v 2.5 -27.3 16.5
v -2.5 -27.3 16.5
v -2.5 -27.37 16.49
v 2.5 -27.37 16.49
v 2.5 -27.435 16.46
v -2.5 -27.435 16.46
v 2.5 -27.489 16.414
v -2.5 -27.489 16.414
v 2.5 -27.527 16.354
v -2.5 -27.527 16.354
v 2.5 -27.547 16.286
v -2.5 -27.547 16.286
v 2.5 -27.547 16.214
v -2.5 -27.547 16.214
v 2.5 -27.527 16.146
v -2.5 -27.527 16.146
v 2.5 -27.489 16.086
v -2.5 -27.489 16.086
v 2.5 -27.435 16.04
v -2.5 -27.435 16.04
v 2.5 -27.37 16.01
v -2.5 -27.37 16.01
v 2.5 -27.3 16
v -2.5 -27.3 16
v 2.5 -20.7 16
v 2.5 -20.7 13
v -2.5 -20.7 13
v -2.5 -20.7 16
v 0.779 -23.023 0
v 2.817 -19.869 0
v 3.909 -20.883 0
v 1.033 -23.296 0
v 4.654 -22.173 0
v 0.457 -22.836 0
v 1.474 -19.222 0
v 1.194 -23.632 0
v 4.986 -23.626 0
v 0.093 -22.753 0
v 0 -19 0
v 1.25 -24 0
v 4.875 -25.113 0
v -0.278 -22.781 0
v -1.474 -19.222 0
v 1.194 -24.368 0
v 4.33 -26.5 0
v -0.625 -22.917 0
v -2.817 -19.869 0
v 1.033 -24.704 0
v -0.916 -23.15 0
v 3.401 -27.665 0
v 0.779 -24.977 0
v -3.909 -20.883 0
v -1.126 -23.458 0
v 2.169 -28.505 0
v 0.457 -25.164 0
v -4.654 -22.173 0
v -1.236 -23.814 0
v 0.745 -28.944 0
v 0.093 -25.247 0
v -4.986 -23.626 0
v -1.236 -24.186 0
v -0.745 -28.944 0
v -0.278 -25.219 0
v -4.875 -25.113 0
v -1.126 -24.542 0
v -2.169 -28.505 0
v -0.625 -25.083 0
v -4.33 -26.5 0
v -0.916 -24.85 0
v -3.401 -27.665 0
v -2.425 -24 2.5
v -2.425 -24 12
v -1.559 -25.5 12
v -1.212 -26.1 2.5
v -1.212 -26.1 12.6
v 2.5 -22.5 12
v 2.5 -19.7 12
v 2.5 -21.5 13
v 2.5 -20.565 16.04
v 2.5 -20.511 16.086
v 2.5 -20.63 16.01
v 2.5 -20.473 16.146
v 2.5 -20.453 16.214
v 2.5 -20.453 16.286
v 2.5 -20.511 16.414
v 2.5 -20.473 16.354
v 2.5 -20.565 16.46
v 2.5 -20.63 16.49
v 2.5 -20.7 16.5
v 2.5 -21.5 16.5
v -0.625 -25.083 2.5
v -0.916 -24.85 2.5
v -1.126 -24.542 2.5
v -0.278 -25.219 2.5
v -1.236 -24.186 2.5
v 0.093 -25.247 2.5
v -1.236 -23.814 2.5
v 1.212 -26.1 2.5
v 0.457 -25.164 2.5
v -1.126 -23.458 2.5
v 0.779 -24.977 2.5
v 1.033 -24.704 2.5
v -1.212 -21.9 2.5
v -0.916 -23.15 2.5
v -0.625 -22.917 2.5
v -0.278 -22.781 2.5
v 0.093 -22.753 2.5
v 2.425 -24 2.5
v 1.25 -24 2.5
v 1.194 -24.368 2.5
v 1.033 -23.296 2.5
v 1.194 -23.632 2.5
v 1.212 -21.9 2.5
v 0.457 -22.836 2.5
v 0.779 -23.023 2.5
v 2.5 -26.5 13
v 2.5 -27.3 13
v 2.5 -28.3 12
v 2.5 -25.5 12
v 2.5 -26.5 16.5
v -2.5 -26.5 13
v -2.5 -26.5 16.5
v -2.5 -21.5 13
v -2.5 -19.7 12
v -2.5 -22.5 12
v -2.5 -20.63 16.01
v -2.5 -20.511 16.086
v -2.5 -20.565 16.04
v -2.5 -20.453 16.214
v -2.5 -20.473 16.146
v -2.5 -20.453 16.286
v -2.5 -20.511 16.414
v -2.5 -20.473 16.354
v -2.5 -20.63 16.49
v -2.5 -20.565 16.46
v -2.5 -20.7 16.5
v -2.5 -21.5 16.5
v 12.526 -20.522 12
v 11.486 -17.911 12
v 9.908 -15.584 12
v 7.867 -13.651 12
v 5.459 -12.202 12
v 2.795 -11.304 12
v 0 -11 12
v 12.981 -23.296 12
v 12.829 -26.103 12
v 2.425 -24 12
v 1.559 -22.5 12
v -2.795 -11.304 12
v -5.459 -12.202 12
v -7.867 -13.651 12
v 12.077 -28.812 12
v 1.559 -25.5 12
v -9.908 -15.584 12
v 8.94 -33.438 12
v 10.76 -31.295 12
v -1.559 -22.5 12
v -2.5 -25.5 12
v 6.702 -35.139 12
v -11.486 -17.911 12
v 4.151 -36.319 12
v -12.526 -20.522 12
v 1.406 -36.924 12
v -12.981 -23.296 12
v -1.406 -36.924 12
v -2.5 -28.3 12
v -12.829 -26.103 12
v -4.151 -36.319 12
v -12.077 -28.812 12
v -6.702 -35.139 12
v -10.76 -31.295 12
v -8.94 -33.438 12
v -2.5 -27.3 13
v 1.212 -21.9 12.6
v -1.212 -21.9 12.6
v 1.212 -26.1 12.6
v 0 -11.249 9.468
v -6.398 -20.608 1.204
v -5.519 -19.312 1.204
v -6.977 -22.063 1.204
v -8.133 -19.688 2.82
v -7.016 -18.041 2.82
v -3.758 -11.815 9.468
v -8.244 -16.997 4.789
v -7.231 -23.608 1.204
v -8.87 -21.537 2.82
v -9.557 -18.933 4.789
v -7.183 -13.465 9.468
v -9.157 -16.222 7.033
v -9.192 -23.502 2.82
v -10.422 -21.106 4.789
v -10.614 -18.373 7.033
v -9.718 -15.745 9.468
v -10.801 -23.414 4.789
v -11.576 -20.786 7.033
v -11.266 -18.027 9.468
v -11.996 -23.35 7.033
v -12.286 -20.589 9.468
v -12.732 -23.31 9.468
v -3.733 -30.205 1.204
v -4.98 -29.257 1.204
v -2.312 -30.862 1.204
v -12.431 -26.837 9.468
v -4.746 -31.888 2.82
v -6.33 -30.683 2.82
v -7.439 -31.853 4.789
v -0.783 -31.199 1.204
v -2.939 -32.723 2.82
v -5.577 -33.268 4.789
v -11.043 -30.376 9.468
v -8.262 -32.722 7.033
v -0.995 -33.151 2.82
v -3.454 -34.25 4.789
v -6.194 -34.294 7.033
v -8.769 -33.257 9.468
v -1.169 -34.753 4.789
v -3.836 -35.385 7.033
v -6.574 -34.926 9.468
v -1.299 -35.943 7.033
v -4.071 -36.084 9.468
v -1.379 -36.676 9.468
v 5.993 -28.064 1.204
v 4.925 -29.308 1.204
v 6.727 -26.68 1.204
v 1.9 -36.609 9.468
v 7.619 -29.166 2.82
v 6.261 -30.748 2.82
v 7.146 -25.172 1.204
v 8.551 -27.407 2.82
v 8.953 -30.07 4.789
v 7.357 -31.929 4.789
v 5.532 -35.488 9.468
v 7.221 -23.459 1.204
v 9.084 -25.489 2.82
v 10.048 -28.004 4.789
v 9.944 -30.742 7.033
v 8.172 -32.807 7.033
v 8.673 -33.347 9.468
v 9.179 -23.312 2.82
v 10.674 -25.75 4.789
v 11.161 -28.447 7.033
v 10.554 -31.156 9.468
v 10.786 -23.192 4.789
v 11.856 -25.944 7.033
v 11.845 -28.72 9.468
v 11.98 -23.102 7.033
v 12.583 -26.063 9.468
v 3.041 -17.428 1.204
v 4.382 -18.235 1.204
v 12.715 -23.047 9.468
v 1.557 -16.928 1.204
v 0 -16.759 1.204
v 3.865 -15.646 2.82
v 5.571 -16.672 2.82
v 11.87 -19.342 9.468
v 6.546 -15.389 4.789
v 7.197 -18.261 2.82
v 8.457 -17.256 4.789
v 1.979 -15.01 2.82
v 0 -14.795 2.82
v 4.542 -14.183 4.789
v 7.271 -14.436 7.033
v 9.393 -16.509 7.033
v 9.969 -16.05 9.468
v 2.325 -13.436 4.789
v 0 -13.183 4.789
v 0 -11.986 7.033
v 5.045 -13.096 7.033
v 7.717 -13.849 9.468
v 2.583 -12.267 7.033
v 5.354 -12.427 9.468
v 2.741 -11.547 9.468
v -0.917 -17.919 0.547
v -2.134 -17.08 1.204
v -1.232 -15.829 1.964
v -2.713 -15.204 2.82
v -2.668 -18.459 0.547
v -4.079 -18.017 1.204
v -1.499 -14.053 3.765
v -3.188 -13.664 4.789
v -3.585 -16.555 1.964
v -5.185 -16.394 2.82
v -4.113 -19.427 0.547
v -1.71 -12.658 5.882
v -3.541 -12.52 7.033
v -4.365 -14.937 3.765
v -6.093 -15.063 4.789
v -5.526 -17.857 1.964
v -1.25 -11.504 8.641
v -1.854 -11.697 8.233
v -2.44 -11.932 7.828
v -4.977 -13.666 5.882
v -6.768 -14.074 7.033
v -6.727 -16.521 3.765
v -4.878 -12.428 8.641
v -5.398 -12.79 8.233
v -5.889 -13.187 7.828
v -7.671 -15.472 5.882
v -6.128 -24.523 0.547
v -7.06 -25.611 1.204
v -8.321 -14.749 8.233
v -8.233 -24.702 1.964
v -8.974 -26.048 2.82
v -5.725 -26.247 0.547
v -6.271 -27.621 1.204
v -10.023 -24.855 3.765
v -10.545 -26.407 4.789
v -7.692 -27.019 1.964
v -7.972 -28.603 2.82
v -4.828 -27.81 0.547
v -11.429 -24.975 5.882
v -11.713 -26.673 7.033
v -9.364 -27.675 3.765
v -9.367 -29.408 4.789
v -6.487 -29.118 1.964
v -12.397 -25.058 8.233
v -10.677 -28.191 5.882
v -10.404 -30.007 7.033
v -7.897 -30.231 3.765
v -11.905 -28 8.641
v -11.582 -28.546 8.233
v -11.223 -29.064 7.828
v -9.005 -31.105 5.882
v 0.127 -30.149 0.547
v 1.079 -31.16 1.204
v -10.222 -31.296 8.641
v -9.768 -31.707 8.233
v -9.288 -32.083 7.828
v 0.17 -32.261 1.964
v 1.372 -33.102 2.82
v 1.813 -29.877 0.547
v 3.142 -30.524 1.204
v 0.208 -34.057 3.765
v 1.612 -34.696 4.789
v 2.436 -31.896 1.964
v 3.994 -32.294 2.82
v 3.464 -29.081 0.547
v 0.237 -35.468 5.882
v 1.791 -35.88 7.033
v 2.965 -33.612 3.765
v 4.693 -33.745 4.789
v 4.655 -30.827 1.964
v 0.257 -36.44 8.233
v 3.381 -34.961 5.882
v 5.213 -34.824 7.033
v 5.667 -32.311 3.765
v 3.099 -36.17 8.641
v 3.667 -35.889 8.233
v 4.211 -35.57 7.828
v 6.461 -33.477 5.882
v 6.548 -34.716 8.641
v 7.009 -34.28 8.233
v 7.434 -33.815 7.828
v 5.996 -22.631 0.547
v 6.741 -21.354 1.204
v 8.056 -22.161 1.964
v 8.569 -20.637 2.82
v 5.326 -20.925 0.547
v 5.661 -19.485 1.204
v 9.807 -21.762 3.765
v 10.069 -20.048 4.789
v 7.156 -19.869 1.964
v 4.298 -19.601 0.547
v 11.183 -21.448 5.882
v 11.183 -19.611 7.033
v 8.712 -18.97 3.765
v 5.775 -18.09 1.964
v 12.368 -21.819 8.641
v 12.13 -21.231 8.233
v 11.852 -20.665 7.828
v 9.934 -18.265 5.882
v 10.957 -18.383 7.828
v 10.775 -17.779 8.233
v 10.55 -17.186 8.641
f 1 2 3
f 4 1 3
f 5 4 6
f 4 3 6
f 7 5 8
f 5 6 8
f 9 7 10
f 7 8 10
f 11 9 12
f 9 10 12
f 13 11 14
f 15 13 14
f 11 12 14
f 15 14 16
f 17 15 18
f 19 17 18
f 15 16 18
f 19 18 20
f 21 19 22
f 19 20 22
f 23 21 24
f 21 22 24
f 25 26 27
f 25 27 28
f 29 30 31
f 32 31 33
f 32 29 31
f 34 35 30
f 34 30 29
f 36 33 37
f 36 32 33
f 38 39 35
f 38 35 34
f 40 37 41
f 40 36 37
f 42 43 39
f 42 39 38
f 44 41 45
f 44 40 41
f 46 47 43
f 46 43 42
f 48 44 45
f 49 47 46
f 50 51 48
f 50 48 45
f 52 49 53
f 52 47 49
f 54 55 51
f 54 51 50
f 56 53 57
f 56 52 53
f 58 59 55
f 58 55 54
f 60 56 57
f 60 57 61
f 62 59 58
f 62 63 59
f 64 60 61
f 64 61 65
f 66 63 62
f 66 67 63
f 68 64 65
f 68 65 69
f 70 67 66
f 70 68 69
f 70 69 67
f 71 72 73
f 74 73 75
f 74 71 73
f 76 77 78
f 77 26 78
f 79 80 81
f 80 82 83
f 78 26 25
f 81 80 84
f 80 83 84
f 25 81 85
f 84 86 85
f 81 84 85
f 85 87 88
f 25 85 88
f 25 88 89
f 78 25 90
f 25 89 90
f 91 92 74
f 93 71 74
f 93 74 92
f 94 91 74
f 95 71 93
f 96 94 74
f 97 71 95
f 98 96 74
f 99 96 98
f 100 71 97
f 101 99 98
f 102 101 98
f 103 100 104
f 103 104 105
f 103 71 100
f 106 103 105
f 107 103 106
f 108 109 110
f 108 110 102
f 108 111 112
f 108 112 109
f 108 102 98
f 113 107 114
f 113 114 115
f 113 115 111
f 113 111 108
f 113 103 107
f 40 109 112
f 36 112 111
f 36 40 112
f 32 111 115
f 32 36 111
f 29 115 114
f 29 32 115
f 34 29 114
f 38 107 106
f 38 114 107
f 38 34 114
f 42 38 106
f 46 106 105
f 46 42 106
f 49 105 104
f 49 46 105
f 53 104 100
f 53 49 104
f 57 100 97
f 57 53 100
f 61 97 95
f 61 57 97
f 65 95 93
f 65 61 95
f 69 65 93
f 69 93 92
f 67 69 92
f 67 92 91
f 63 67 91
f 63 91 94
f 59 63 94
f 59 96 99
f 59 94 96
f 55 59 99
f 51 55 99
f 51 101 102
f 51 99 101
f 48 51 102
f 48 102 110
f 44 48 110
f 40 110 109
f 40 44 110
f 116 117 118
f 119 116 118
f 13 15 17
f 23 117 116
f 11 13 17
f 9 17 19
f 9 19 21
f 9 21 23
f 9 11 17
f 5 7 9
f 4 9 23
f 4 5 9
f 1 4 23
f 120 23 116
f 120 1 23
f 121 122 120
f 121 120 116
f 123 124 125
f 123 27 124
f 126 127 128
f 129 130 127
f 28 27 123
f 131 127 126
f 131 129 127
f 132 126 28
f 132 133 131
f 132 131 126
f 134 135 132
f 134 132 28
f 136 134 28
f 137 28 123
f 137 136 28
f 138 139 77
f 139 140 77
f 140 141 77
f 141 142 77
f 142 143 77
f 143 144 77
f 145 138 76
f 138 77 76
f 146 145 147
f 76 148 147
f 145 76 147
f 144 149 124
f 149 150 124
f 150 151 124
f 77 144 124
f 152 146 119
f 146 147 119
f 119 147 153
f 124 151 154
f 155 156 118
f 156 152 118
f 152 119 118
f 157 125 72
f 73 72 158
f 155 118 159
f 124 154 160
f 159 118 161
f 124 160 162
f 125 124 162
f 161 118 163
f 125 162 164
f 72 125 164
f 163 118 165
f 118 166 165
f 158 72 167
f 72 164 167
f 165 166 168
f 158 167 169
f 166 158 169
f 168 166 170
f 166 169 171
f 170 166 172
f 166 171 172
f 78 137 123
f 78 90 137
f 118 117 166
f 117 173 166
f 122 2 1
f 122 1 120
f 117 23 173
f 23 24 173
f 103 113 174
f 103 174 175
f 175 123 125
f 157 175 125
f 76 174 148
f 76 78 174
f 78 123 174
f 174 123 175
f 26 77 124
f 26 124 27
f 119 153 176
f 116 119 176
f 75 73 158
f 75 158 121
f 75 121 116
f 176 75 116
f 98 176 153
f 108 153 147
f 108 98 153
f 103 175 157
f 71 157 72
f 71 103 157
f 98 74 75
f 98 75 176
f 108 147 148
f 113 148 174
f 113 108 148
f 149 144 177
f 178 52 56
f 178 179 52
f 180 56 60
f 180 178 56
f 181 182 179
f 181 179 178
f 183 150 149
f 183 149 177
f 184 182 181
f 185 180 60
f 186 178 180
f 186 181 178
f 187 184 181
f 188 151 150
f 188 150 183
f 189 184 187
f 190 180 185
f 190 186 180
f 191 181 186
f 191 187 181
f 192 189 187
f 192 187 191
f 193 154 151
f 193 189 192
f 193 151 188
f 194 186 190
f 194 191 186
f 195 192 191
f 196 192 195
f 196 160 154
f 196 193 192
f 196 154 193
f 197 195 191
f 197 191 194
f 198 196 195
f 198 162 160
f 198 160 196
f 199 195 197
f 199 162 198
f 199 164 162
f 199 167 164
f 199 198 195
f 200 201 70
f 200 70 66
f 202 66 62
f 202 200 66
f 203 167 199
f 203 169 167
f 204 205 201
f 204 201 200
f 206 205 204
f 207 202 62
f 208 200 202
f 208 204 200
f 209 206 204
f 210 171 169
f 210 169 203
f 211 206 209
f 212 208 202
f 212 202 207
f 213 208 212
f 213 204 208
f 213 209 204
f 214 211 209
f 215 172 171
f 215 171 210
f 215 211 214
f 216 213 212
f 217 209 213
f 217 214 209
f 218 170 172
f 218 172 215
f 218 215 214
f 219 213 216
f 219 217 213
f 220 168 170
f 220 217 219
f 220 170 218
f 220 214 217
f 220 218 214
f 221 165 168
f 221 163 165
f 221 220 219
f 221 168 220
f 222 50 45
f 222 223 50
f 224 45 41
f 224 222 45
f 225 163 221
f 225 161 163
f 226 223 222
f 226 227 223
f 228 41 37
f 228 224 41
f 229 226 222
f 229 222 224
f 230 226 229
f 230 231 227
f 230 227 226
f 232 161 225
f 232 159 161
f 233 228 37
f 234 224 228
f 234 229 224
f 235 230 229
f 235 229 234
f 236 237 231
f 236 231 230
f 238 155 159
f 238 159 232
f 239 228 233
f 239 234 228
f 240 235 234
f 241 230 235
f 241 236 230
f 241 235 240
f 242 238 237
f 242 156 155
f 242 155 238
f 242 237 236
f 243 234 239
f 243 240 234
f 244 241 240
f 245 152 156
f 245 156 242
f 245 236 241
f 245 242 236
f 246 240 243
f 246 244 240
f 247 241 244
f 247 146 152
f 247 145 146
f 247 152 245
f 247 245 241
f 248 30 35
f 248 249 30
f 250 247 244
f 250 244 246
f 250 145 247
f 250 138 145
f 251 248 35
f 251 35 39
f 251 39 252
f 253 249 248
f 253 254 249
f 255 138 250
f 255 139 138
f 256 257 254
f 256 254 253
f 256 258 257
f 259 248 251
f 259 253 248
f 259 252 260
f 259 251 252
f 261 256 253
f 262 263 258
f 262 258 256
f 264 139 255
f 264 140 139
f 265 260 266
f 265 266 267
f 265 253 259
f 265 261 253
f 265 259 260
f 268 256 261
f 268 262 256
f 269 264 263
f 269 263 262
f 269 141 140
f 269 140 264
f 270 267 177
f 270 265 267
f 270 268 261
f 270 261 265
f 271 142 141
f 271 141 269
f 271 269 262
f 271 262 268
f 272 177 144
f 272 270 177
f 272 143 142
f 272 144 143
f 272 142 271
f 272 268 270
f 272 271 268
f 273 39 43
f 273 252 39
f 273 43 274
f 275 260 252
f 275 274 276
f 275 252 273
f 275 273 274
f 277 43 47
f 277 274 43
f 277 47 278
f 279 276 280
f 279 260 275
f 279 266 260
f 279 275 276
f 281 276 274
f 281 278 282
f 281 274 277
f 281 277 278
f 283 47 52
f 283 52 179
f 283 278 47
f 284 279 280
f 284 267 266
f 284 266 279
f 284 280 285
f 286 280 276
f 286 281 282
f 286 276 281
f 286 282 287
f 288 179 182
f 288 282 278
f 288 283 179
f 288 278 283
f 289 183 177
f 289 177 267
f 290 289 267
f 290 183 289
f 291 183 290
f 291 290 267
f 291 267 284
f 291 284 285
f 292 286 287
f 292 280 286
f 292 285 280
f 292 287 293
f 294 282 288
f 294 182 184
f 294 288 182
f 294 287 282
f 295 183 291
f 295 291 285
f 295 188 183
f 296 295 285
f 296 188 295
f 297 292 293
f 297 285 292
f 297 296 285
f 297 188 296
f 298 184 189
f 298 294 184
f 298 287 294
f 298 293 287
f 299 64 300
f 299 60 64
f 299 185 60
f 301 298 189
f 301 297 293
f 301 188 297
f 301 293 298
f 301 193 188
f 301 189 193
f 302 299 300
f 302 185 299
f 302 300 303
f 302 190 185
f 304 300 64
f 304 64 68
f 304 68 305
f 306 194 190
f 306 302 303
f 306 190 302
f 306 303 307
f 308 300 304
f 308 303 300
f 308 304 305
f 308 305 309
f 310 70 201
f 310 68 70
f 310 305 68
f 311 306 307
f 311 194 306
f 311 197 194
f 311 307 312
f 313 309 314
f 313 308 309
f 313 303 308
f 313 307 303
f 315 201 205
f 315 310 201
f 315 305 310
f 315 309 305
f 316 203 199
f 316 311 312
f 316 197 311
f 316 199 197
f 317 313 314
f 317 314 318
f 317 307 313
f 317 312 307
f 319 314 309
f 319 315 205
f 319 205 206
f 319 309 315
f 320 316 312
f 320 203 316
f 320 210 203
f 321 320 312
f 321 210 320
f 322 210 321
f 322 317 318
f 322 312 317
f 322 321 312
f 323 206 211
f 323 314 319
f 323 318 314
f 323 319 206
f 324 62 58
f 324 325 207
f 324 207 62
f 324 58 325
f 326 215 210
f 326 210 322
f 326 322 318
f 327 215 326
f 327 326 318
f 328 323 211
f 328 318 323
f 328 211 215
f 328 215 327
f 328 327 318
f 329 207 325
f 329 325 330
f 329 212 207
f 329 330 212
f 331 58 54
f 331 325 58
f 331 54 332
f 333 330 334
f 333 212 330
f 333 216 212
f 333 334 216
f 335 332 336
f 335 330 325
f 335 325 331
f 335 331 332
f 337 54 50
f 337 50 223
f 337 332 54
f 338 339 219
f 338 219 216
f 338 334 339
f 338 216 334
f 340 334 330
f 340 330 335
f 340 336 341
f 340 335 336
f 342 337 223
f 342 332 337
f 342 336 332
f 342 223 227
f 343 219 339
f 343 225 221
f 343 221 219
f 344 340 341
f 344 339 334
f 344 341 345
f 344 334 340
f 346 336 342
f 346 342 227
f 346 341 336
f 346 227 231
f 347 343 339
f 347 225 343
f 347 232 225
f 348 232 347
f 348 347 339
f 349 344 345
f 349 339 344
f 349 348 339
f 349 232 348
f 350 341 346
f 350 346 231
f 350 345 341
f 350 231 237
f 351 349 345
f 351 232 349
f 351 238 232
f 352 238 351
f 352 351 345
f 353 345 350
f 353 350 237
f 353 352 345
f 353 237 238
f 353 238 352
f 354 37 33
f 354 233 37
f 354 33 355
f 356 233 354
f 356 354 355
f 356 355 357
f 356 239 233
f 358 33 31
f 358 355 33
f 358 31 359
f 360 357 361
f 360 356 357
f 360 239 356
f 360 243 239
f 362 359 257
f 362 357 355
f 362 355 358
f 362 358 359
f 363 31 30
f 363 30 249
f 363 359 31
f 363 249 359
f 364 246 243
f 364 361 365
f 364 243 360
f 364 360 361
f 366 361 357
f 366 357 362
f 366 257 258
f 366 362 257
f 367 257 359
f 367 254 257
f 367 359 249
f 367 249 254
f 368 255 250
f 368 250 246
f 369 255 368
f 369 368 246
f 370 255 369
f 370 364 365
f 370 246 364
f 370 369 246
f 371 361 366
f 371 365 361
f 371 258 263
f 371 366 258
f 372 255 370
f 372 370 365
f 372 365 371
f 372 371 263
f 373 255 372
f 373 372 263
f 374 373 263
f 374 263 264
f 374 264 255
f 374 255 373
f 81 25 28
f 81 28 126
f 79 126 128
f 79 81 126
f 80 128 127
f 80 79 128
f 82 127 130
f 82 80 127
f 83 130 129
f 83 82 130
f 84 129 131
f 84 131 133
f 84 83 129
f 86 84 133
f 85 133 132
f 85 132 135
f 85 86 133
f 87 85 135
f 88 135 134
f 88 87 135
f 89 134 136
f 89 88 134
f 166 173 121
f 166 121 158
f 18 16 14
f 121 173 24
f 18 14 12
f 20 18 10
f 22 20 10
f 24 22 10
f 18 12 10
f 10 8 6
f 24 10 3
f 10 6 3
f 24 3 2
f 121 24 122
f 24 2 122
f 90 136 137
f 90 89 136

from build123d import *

# Parameters (mm, degrees)
SKETCH024_R          = 1.25
POCKET007_DEPTH      = 12.001
PAD001_DEPTH         = 2.5
POCKET008_DEPTH      = 7.5
POCKET008_DEPTH_BACK = 100


with BuildPart() as part:
    # Sketch023 → Revolution001 (revolve)
    with BuildSketch(Plane.YZ):
        with BuildLine():
            Line((0, 0), (0, 12))
            Line((0, 12), (13, 12))
            ThreePointArc((5, 0), (10.816654, 4.788897), (13, 12))
            Line((0, 0), (5, 0))
        make_face()
    revolve(axis=Axis((0, 0, 0), (0, 0, 1)))

    # Sketch024 → Pocket007 (cut, through all)
    with BuildSketch(Plane.XY):
        Circle(SKETCH024_R)
    extrude(amount=POCKET007_DEPTH, mode=Mode.SUBTRACT)

    # Sketch025 (on DatumPlane) → Pad001 (join, symmetric)
    with BuildSketch(Plane(origin=(0, 0, 12), x_dir=(0, 1, 0), z_dir=(1, 0, 0))):
        with BuildLine():
            ThreePointArc((-3.3, 4.5), (-3.55, 4.25), (-3.3, 4))
            Line((-3.3, 4), (-3.3, 1))
            Line((-3.3, 1), (-4.3, 0))
            Line((-4.3, 0), (-1.5, 0))
            Line((-1.5, 0), (-2.5, 1))
            Line((-2.5, 4.5), (-2.5, 1))
            Line((-3.3, 4.5), (-2.5, 4.5))
        make_face()
        with BuildLine():
            Line((4.3, 0), (1.5, 0))
            Line((2.5, 1), (1.5, 0))
            Line((2.5, 4.5), (2.5, 1))
            Line((3.3, 4.5), (2.5, 4.5))
            ThreePointArc((3.3, 4), (3.55, 4.25), (3.3, 4.5))
            Line((3.3, 1), (3.3, 4))
            Line((4.3, 0), (3.3, 1))
        make_face()
    extrude(amount=PAD001_DEPTH, both=True)

    # Sketch026 (on DatumPlane) → Pocket008 (cut, two sides)
    with BuildSketch(Plane.XY.offset(10)) as pocket008_sk:
        Polygon((1.212436, -2.1), (2.424871, 0), (1.212436, 2.1), (-1.212436, 2.1), (-2.424871, 0), (-1.212436, -2.1), align=None)
    extrude(amount=-POCKET008_DEPTH, mode=Mode.SUBTRACT)
    extrude(pocket008_sk.sketch, amount=POCKET008_DEPTH_BACK, mode=Mode.SUBTRACT)


with BuildPart() as part_1:
    # Body007 placement: moved
    add(part.part.moved(Location((0, -24, 0))))


solid = part_1.part
